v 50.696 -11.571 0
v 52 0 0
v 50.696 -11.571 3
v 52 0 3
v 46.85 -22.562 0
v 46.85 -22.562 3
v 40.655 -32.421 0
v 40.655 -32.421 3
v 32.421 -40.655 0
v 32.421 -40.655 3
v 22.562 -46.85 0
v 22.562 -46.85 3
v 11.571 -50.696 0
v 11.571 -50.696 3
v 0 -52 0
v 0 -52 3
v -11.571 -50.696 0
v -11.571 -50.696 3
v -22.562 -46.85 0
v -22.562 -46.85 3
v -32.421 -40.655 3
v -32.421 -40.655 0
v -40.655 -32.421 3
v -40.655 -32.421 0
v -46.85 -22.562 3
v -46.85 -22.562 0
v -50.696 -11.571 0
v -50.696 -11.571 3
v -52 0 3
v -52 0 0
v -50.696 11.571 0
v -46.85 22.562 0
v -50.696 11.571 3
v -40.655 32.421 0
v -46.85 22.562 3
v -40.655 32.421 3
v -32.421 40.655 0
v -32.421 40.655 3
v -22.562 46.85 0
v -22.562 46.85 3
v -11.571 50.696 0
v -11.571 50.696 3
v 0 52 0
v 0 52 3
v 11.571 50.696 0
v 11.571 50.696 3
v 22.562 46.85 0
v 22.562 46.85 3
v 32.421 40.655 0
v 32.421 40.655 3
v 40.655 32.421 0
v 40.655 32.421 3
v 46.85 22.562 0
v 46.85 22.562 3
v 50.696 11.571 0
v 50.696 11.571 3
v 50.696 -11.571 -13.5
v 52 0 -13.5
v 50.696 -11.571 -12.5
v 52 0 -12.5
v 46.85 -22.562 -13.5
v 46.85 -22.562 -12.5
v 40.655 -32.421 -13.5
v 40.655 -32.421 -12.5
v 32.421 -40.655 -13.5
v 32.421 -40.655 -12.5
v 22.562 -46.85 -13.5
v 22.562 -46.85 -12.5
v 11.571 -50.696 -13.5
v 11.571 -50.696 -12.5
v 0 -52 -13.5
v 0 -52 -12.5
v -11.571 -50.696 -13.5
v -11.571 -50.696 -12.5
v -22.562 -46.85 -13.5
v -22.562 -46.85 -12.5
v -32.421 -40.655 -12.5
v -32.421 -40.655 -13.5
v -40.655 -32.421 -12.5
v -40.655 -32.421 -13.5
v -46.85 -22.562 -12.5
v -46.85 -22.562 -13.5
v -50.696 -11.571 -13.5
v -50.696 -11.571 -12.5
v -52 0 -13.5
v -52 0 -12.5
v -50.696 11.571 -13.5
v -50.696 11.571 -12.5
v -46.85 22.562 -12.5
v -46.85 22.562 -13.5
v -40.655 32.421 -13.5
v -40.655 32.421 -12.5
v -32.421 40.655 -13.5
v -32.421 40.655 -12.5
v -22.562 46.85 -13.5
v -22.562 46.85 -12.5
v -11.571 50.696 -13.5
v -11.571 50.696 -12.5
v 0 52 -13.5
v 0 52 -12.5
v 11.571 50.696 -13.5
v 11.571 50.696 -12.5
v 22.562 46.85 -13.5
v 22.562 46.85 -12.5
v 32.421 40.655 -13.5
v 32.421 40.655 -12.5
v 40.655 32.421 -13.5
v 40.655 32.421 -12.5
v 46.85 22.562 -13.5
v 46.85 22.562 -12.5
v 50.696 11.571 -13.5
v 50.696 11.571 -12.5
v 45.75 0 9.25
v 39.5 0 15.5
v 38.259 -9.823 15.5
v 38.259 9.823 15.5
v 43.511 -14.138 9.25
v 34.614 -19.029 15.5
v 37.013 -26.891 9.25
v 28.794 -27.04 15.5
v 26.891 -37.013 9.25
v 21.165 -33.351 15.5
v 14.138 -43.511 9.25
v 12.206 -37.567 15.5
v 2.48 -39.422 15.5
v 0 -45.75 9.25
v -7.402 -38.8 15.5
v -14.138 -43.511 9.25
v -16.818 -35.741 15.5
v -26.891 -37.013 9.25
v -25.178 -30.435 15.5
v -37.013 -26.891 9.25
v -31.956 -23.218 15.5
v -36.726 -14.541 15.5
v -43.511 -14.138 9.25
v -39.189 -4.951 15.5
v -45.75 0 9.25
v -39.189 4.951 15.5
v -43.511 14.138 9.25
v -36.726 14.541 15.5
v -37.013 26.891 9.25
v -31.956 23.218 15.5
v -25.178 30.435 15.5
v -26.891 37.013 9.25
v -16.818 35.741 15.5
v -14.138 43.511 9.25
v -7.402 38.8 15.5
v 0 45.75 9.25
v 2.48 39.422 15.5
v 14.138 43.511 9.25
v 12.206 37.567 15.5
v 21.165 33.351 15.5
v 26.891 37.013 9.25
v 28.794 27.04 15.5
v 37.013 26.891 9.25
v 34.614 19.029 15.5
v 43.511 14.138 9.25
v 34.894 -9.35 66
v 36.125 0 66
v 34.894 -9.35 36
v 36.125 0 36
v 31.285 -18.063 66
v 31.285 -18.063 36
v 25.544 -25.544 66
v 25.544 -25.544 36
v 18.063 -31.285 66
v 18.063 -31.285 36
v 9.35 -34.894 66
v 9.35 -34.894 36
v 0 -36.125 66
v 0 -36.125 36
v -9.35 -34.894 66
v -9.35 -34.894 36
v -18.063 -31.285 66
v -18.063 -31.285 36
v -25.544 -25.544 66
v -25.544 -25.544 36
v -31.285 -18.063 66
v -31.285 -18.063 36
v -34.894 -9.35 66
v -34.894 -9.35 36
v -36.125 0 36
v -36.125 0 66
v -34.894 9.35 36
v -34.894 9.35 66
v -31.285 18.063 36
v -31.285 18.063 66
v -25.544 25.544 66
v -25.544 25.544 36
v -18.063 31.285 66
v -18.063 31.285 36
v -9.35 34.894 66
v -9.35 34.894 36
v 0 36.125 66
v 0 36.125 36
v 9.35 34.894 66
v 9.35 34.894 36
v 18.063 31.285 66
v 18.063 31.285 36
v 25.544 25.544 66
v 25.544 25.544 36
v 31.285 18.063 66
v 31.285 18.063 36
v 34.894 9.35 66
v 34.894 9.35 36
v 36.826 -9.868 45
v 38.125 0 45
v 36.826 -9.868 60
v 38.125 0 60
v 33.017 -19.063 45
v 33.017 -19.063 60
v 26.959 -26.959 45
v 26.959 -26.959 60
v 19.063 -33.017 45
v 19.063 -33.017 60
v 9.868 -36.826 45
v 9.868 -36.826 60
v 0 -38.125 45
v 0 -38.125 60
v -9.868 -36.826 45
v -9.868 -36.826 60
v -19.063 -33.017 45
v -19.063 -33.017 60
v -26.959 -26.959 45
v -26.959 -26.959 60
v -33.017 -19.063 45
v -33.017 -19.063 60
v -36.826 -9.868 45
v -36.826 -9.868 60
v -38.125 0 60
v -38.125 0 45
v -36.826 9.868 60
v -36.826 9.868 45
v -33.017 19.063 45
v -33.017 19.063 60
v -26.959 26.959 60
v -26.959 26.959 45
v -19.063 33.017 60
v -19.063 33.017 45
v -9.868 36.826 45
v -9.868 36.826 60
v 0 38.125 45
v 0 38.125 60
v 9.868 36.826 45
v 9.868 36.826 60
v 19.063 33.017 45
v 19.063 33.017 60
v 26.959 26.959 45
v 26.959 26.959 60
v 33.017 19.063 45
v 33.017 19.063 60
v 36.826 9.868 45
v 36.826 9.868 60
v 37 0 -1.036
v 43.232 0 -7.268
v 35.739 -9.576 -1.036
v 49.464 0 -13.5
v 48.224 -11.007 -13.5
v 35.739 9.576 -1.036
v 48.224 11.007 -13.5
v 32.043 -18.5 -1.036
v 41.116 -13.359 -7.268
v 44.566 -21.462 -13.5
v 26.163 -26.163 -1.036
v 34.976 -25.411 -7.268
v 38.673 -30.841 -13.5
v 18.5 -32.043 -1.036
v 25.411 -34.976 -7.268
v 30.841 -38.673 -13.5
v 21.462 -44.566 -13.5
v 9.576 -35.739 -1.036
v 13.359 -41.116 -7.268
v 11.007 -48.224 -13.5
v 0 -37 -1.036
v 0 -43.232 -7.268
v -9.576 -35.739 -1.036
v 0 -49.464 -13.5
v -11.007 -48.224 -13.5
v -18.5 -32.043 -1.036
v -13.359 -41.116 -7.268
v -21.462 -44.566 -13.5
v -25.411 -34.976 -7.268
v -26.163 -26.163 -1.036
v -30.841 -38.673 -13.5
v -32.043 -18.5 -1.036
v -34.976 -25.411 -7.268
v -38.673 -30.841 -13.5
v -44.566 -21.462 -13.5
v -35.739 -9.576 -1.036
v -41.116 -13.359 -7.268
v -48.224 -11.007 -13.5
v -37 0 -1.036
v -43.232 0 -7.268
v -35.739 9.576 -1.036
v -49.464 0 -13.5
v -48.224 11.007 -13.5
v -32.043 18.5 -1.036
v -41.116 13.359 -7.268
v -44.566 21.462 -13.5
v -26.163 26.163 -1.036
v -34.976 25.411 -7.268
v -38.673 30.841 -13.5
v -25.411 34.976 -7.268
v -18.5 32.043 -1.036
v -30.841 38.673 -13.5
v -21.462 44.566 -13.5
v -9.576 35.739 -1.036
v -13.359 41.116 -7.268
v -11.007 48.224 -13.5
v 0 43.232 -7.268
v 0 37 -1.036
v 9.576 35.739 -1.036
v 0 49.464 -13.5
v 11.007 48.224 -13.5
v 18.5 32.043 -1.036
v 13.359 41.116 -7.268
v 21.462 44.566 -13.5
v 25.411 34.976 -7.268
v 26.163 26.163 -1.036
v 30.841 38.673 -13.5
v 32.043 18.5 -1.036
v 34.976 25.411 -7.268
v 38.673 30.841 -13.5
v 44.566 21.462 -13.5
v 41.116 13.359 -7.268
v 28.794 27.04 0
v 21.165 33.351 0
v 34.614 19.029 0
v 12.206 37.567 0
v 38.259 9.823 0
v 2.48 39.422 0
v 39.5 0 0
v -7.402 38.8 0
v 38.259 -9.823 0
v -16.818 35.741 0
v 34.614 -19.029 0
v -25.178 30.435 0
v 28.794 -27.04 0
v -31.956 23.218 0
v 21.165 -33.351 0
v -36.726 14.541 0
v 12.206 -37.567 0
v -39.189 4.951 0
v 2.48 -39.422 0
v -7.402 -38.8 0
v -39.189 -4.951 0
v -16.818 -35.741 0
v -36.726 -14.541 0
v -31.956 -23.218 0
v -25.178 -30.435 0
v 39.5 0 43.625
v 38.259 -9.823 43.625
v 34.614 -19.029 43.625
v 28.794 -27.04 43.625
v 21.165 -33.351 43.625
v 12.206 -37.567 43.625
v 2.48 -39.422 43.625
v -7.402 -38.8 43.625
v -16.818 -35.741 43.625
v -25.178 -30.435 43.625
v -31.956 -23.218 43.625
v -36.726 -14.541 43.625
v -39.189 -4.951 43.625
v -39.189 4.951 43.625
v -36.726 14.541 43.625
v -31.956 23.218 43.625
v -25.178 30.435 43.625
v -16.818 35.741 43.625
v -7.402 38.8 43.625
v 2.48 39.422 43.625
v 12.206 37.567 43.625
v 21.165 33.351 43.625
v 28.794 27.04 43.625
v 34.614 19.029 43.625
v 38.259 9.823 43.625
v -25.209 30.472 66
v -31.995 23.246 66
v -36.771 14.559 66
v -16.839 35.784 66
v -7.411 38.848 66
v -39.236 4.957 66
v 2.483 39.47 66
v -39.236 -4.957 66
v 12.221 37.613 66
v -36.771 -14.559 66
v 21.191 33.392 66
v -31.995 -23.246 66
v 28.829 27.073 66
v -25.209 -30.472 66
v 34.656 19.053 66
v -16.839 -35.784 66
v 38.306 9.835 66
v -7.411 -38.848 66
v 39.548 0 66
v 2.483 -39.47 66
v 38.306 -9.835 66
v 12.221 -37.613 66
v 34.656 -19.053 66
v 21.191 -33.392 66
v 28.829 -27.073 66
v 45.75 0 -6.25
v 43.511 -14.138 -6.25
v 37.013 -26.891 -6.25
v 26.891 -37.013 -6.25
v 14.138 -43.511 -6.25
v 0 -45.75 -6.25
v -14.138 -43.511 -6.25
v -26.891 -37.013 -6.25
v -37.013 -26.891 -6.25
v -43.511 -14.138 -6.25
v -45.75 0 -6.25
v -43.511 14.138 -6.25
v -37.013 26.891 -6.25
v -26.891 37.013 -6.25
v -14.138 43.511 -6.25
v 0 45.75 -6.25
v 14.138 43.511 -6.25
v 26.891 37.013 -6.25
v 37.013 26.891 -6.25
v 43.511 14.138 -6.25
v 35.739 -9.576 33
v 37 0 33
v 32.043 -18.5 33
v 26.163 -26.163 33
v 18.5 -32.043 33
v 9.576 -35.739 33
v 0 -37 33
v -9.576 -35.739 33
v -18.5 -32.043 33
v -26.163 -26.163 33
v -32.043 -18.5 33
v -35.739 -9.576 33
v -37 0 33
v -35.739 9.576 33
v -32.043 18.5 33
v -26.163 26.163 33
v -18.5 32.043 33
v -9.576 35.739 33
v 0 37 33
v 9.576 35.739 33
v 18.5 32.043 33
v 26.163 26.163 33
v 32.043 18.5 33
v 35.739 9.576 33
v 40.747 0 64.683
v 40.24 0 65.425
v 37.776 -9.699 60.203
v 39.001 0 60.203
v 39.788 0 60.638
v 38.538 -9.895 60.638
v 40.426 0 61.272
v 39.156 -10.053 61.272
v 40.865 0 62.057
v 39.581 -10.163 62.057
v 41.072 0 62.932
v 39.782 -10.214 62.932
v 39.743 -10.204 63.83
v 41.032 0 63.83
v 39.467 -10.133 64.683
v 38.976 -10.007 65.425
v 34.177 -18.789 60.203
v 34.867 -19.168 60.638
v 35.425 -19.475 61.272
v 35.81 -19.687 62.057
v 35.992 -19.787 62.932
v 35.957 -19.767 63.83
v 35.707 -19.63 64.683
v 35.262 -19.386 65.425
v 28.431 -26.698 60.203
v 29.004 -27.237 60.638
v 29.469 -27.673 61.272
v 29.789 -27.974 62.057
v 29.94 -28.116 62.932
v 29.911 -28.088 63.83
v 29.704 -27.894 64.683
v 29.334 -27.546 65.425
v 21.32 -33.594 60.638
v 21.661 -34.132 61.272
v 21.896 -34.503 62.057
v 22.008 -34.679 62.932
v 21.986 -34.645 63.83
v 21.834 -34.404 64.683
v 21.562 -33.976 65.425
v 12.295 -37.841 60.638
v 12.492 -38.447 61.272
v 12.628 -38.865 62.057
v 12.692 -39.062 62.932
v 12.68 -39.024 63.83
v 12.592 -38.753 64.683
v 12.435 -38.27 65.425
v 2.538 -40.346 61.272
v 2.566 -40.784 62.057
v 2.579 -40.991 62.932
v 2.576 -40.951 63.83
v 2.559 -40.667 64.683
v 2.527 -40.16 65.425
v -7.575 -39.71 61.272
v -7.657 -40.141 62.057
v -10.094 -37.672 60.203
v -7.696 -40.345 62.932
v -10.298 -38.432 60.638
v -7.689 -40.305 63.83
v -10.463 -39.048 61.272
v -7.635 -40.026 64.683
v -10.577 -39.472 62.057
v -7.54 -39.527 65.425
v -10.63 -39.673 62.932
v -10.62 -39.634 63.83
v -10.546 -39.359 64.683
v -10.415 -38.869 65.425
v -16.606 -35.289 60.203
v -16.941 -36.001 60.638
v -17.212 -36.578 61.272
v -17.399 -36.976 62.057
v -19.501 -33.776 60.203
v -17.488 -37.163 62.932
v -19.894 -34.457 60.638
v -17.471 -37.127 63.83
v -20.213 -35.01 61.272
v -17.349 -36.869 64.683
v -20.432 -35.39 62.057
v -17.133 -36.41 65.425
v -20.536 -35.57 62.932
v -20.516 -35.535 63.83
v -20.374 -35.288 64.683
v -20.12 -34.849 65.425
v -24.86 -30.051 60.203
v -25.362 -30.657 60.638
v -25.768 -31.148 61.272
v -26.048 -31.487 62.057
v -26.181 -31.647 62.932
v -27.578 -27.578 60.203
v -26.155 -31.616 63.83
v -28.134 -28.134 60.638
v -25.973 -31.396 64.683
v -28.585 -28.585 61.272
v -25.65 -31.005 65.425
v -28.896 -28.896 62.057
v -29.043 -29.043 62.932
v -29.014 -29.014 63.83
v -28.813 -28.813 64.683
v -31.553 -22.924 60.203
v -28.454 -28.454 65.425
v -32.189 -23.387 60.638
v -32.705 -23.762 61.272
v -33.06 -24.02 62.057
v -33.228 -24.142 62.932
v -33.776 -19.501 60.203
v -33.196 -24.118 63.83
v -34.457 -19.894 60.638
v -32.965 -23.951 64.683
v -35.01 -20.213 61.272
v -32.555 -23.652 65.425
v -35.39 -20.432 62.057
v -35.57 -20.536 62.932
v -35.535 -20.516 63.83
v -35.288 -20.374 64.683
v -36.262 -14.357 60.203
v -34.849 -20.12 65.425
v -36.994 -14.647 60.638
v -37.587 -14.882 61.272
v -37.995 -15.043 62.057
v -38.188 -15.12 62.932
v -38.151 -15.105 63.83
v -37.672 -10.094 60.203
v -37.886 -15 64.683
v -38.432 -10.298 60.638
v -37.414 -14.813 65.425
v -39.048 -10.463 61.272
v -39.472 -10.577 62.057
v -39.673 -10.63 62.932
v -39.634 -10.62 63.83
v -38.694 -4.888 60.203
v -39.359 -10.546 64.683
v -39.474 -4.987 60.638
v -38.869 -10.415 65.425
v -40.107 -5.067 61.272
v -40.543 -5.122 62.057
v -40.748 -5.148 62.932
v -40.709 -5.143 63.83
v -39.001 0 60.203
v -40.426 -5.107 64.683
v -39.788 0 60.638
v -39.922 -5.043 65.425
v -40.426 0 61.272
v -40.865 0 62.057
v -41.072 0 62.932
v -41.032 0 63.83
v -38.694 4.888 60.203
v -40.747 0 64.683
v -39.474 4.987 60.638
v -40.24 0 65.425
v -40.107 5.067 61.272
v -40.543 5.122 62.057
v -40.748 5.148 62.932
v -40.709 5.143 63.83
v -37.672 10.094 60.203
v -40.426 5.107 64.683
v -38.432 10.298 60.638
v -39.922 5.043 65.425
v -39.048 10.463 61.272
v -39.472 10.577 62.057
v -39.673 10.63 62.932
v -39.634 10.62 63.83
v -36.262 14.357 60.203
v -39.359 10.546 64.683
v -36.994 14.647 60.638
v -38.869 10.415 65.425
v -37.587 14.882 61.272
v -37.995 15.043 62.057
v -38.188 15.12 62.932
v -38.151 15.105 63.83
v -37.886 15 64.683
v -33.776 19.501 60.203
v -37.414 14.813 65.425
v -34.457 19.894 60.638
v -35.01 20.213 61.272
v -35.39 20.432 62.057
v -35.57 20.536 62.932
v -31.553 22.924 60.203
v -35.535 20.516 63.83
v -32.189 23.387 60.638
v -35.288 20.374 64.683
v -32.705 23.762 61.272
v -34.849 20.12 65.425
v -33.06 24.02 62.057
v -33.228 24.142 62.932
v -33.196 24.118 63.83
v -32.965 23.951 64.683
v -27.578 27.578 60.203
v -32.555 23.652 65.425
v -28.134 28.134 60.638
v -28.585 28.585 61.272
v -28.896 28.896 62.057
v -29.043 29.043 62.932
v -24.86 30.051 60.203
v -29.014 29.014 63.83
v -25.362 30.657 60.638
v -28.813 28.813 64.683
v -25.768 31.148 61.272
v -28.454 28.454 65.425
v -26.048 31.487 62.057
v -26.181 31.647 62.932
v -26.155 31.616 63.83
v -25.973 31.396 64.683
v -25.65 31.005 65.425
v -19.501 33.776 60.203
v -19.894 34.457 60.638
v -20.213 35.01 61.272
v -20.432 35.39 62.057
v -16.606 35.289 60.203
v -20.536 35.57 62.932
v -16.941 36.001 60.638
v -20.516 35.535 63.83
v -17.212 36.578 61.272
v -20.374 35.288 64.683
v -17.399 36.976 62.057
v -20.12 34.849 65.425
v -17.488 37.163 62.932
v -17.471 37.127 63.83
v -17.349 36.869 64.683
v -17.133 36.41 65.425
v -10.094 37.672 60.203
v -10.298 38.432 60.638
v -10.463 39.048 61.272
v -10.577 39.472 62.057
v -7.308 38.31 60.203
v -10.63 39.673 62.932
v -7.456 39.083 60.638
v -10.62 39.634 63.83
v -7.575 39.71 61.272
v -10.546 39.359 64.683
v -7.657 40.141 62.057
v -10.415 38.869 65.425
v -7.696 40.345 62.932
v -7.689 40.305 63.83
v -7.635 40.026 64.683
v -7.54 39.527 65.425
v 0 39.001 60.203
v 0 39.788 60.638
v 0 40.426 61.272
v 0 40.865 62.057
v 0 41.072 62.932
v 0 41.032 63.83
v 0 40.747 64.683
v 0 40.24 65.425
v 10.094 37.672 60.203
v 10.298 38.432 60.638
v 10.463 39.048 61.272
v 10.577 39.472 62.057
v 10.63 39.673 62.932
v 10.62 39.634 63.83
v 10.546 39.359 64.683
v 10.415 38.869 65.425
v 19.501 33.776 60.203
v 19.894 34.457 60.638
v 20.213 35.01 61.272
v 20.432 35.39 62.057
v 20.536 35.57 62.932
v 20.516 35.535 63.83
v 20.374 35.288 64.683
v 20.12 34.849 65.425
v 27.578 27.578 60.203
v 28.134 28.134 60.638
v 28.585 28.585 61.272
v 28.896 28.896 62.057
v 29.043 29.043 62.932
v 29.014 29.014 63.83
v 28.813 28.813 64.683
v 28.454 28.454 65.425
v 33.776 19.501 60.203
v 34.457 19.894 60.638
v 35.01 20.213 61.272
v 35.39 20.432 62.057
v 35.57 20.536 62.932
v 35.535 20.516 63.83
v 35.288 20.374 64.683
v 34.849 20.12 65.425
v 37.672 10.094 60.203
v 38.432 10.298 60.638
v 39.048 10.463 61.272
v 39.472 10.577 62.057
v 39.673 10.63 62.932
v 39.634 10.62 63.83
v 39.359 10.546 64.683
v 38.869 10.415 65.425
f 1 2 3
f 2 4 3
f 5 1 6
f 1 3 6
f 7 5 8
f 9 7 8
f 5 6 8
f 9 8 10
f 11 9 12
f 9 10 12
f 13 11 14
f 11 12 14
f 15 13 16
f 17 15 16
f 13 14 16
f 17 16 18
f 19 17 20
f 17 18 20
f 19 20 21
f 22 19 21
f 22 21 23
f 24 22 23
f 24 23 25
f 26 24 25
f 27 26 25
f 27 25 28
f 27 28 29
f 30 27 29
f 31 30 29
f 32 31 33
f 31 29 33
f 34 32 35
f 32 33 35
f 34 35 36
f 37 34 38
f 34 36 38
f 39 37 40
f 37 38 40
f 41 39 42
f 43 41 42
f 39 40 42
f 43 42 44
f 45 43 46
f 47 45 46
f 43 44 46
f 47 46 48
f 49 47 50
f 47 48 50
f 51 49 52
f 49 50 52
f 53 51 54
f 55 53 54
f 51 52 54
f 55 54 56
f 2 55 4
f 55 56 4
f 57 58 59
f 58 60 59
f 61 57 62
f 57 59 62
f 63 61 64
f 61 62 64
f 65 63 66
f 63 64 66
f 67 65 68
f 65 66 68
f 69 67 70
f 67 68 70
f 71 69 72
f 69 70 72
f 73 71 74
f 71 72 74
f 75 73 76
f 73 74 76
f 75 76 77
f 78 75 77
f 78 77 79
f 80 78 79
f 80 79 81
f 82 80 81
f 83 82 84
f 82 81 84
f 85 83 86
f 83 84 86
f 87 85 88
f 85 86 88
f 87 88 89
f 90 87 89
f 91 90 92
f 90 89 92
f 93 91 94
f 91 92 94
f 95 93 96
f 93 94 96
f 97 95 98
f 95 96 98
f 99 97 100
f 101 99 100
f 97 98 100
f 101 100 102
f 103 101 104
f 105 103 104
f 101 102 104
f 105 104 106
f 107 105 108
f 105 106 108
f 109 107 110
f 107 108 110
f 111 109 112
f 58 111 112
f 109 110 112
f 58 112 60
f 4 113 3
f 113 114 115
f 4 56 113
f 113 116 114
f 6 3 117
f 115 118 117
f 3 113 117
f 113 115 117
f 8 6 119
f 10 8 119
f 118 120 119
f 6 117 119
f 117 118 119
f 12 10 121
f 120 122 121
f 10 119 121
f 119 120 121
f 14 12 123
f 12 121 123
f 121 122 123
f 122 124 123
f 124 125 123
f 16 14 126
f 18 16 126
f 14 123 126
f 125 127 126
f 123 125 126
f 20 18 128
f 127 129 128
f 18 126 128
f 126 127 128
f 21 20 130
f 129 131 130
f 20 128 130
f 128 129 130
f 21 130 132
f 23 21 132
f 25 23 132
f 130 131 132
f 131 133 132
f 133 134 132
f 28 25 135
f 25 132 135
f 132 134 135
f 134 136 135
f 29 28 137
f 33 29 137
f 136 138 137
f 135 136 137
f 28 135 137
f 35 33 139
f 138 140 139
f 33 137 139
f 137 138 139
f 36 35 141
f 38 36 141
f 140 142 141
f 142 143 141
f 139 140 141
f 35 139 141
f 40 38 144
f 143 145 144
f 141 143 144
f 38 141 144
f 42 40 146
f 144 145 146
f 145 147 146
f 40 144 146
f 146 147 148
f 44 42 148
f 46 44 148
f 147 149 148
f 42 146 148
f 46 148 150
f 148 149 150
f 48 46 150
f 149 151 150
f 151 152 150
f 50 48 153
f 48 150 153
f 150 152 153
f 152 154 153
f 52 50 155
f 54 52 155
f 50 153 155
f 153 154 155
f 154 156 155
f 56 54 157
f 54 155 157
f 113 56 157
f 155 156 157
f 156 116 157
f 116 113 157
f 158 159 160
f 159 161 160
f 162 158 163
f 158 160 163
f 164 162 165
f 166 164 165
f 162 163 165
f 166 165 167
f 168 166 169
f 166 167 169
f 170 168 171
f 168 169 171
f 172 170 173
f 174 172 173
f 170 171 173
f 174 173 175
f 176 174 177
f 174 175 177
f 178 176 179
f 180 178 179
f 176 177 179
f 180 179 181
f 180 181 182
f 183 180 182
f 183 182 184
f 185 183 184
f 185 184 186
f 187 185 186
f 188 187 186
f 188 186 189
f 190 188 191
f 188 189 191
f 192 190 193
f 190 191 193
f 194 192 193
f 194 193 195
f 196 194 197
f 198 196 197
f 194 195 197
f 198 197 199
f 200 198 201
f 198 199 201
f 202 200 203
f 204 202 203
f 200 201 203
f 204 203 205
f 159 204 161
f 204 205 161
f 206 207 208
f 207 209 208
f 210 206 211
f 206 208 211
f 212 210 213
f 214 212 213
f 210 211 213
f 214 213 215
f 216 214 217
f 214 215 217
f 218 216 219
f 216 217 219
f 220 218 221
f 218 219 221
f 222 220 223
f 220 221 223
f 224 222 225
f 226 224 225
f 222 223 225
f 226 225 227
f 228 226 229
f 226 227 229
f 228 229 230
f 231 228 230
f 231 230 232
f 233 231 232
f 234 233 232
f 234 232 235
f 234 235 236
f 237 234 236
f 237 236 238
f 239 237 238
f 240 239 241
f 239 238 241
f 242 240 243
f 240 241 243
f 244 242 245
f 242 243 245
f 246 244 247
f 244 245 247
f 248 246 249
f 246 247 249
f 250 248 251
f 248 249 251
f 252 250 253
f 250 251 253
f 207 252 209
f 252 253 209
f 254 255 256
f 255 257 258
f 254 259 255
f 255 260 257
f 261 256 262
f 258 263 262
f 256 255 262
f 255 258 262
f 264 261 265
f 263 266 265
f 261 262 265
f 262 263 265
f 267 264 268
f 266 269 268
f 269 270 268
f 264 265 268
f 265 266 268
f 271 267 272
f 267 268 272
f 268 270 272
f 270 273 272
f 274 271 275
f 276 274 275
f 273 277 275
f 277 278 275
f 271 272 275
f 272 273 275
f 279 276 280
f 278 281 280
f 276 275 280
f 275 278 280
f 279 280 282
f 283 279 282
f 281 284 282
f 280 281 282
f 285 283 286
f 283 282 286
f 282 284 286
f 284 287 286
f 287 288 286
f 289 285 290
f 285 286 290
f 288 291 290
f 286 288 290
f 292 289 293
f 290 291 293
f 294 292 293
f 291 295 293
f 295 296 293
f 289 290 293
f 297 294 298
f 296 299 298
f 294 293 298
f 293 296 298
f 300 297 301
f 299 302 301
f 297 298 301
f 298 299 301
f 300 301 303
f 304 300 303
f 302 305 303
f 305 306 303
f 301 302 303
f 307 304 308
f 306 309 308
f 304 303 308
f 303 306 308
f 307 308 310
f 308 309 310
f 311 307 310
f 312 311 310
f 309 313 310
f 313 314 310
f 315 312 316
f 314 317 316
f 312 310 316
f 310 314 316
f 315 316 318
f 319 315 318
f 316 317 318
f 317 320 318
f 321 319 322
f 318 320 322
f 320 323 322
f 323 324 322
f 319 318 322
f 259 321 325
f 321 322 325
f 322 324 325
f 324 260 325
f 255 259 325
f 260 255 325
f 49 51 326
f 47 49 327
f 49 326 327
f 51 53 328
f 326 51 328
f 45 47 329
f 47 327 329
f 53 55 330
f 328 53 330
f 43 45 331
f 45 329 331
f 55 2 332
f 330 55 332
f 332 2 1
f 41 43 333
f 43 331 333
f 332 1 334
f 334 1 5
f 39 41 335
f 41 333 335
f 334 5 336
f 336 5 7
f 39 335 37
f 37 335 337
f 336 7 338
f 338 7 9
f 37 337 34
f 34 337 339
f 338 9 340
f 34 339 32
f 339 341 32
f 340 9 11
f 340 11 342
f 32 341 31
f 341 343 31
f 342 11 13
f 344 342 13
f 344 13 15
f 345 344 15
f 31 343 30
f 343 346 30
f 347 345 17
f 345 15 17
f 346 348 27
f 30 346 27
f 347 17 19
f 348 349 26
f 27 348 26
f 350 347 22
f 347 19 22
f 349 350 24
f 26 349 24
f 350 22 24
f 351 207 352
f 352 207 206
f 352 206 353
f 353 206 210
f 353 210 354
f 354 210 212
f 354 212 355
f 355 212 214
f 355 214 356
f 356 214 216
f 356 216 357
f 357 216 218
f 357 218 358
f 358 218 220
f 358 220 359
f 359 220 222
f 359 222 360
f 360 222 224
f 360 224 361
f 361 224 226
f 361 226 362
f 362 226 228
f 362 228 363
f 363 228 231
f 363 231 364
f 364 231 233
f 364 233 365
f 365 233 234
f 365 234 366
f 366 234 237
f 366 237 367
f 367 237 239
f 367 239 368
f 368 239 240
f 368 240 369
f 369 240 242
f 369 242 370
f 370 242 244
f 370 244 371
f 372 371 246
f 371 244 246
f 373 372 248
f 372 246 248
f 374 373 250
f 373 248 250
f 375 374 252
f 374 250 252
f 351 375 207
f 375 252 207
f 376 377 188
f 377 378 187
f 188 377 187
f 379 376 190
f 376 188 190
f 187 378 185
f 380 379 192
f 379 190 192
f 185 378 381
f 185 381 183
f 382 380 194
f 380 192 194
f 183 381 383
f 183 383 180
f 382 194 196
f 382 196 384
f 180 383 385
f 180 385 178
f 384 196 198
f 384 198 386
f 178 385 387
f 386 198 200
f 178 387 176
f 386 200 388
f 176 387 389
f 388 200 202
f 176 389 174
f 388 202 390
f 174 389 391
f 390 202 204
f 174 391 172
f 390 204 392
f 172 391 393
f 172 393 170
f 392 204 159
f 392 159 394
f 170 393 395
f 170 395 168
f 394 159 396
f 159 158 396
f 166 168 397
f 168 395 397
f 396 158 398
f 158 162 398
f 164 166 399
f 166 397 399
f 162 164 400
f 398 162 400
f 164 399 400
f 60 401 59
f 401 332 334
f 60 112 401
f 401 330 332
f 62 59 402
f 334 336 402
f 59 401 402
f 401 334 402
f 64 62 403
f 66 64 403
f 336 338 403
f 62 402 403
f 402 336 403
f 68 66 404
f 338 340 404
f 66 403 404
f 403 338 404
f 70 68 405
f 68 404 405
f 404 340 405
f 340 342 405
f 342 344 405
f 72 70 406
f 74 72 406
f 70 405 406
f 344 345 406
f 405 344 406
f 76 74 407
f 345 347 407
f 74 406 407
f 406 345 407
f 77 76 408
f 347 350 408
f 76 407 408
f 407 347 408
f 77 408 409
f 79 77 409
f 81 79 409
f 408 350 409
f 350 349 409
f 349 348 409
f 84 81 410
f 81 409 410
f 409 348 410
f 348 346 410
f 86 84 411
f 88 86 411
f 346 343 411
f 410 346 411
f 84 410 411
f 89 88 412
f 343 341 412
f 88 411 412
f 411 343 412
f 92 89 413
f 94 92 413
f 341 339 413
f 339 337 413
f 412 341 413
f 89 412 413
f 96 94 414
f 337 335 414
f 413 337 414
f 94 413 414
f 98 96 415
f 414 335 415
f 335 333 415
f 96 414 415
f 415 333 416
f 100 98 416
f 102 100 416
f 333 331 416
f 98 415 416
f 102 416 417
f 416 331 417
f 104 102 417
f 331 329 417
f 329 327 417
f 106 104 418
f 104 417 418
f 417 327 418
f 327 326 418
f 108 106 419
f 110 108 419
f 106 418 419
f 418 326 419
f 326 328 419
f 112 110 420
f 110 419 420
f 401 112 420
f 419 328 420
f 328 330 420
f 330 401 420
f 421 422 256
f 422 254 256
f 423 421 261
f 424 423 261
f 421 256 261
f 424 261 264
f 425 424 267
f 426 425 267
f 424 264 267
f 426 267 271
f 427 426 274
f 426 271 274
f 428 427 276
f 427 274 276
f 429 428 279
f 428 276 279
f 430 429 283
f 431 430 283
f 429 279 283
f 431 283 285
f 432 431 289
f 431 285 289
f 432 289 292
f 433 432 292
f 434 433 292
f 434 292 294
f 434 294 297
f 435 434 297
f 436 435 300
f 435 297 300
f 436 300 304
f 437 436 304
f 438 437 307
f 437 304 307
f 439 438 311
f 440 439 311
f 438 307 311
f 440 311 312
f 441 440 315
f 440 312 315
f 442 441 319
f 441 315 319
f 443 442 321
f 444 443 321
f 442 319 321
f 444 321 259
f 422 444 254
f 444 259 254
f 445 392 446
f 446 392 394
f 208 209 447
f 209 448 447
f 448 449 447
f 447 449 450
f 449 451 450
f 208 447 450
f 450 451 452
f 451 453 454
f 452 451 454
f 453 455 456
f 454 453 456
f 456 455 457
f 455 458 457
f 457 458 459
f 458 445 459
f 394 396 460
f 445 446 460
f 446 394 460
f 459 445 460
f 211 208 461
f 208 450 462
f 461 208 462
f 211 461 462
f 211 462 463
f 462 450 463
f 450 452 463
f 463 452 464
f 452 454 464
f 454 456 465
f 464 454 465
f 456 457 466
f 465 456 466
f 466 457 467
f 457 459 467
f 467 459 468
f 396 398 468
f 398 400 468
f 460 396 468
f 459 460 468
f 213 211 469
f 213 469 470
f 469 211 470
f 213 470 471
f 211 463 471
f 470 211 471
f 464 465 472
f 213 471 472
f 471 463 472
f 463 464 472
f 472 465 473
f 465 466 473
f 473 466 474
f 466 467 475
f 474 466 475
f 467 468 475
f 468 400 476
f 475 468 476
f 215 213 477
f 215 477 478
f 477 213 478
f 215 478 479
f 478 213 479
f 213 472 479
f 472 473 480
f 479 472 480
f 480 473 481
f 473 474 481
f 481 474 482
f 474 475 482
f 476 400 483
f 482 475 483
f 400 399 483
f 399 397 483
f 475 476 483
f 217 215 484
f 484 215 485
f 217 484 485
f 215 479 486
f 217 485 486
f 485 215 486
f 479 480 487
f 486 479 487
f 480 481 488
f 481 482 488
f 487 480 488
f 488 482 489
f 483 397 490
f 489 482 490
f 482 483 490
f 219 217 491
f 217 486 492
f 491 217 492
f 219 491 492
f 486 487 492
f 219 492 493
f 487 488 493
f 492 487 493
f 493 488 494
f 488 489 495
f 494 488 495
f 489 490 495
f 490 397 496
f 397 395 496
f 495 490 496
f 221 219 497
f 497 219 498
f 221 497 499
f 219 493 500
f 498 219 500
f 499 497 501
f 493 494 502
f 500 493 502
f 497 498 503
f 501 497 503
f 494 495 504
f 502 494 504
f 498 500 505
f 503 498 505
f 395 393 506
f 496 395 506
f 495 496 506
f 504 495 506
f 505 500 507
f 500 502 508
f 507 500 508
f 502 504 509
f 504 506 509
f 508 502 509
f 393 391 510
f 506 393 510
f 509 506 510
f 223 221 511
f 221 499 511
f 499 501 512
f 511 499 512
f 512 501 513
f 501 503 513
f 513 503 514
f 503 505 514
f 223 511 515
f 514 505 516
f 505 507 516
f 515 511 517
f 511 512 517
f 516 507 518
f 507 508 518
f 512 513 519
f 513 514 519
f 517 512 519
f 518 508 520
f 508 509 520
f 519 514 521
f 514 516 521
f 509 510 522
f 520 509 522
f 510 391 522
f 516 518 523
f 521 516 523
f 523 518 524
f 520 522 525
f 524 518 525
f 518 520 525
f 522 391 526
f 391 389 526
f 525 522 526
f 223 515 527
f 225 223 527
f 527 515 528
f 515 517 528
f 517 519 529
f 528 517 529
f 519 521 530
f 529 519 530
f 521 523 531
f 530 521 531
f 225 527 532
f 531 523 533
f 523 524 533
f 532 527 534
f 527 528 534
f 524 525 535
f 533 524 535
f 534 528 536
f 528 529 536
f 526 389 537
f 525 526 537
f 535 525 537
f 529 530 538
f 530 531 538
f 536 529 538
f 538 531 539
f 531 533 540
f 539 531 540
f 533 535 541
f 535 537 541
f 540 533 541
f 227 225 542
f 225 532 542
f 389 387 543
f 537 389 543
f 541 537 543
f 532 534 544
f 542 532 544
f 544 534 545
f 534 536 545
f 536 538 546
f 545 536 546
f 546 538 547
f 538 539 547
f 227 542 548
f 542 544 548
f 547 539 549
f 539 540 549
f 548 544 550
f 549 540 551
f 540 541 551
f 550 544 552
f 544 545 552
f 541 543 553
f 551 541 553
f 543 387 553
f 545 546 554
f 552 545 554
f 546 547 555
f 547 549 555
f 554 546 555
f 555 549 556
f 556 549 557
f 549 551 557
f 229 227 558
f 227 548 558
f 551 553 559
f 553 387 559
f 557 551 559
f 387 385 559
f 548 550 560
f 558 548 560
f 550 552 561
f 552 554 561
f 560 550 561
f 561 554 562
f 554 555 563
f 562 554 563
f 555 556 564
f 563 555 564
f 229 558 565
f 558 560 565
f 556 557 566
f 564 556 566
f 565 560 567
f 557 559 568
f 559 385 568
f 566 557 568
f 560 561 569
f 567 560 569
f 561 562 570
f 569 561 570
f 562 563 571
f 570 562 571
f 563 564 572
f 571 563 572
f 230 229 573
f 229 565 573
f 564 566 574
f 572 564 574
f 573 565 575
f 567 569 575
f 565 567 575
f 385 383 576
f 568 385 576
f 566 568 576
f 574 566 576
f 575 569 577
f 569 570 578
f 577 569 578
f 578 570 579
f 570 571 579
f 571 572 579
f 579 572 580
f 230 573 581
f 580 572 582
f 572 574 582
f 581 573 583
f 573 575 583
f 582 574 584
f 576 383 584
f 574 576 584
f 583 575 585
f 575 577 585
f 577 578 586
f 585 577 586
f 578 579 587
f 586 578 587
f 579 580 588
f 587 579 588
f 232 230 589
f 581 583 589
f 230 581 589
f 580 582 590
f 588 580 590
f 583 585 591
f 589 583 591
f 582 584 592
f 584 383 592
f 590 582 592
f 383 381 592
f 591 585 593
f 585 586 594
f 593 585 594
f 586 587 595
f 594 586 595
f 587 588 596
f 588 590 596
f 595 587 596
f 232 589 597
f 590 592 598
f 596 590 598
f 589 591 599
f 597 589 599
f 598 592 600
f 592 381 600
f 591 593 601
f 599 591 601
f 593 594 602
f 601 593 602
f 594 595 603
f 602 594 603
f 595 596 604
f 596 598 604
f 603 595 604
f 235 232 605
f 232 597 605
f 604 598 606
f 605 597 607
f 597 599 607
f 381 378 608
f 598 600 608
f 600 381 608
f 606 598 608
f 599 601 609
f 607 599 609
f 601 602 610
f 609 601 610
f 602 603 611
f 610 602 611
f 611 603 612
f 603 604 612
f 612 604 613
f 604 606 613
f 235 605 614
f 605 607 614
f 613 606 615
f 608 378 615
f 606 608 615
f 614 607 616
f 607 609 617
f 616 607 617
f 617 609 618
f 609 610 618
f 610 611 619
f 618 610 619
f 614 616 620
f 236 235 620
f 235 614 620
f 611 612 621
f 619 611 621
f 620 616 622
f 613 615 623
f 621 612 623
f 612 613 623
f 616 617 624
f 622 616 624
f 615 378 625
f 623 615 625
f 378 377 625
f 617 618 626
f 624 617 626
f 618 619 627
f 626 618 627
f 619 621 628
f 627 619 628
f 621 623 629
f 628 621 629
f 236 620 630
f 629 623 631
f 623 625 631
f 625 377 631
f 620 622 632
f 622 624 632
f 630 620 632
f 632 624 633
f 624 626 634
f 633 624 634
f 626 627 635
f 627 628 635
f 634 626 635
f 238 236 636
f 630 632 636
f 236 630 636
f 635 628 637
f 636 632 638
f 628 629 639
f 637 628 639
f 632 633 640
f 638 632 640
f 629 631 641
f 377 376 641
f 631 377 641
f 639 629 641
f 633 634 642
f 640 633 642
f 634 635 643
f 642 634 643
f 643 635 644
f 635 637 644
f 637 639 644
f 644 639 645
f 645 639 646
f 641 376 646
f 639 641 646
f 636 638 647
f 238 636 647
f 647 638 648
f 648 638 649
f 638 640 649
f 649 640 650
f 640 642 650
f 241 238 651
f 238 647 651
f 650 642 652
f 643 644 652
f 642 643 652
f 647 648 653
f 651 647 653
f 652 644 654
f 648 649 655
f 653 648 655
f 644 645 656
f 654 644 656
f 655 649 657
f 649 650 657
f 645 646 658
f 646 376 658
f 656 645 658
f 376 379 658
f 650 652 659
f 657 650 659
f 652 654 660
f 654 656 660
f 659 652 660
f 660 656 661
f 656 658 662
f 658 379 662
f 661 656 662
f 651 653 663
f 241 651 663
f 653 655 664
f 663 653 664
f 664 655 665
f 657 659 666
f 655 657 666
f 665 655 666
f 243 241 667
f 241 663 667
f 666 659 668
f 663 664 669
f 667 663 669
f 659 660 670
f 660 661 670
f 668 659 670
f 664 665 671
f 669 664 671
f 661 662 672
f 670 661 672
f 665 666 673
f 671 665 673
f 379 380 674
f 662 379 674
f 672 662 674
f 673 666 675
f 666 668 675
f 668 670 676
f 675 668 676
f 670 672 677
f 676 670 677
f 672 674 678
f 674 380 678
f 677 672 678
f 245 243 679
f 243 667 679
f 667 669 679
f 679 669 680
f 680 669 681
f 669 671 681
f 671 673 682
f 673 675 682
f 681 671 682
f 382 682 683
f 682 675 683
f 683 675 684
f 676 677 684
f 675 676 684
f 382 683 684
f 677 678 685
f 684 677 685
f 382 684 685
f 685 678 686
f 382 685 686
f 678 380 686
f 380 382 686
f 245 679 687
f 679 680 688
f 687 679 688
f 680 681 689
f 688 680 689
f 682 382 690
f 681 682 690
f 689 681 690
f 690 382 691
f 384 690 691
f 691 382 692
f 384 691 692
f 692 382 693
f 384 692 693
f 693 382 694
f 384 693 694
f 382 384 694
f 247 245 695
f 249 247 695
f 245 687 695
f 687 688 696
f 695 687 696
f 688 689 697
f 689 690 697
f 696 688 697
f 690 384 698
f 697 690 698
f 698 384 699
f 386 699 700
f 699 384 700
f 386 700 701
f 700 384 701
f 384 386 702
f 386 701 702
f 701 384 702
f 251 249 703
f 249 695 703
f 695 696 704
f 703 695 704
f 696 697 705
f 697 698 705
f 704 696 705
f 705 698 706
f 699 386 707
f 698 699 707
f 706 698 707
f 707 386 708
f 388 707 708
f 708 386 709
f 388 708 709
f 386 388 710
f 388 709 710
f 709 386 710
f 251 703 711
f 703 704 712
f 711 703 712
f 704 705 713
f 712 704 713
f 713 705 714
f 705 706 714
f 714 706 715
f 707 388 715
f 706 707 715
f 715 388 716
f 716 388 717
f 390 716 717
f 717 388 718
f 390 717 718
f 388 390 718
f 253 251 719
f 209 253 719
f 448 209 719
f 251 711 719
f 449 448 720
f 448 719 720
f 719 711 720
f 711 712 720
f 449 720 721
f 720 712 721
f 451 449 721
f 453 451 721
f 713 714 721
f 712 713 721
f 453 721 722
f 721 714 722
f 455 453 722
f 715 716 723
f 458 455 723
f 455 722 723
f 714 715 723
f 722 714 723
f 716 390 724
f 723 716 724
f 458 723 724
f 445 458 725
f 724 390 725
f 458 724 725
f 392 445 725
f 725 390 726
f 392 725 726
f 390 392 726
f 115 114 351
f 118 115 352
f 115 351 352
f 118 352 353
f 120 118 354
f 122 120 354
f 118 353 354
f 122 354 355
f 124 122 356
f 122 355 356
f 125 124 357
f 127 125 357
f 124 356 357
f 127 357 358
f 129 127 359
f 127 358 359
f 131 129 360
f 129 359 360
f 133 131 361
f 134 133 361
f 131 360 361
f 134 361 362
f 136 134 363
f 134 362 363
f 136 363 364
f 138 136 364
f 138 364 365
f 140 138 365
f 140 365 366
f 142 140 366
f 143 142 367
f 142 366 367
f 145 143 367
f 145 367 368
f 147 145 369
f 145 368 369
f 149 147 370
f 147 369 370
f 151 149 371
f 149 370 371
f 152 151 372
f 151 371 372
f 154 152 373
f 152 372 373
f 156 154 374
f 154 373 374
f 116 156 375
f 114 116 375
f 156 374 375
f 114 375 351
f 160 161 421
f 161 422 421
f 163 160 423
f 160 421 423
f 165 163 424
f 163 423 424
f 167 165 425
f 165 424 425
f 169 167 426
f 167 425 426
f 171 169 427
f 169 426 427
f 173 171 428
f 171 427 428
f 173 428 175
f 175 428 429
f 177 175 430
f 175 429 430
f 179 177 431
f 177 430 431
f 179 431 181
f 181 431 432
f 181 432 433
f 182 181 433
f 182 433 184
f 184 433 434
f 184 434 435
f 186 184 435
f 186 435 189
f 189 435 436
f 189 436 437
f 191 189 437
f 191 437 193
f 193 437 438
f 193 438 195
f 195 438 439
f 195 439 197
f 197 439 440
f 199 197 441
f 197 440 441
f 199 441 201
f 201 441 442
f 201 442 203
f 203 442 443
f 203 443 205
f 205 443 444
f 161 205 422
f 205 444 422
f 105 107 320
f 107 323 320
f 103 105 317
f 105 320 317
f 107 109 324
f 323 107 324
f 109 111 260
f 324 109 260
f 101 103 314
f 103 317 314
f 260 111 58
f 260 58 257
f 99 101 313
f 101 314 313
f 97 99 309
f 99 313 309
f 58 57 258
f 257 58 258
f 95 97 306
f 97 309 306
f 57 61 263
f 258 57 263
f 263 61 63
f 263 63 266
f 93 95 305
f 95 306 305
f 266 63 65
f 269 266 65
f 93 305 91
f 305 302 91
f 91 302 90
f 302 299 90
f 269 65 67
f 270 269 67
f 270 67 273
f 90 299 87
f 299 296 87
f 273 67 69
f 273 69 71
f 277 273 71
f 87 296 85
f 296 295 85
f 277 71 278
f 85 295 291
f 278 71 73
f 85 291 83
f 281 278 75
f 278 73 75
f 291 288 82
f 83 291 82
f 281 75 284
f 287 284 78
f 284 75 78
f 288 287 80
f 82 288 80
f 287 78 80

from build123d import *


# Not quite as in the source:
# - a feature names something its author has since deleted; it is built from what else it names


with BuildPart() as f1:
    # F0 (on Front) → F1 (revolve)
    with BuildSketch(Plane.XZ):
        with BuildLine():
            Line((52, -12.5), (39.5, 0))
            Line((39.5, 0), (52, 0))
            Line((52, 0), (52, 3))
            Line((52, 3), (39.5, 3))
            Line((39.5, 3), (39.5, 15.5))
            Line((39.5, 15.5), (39.5, 43.6252272915))
            Line((39.5, 43.6252272915), (38.1252272915, 45))
            Line((38.1252272915, 45), (38.1252272915, 60))
            ThreePointArc((38.1252272915, 60), (40.9990174252, 62.4871708245), (39.5482522386, 66))
            Line((39.5482522386, 66), (36.1252272915, 66))
            Line((36.1252272915, 66), (36.1252272915, 36))
            Line((36.1252272915, 36), (37, 33))
            Line((37, 33), (37, -1.0355339059))
            Line((37, -1.0355339059), (49.4644660941, -13.5))
            Line((49.4644660941, -13.5), (52, -13.5))
            Line((52, -13.5), (52, -12.5))
        make_face()
        Polygon((39.5, 3), (52, 3), (39.5, 15.5), align=None)
    revolve(axis=Axis((0, 0, 34.5994567809), (0, 0, -1)))


solid = f1.part
